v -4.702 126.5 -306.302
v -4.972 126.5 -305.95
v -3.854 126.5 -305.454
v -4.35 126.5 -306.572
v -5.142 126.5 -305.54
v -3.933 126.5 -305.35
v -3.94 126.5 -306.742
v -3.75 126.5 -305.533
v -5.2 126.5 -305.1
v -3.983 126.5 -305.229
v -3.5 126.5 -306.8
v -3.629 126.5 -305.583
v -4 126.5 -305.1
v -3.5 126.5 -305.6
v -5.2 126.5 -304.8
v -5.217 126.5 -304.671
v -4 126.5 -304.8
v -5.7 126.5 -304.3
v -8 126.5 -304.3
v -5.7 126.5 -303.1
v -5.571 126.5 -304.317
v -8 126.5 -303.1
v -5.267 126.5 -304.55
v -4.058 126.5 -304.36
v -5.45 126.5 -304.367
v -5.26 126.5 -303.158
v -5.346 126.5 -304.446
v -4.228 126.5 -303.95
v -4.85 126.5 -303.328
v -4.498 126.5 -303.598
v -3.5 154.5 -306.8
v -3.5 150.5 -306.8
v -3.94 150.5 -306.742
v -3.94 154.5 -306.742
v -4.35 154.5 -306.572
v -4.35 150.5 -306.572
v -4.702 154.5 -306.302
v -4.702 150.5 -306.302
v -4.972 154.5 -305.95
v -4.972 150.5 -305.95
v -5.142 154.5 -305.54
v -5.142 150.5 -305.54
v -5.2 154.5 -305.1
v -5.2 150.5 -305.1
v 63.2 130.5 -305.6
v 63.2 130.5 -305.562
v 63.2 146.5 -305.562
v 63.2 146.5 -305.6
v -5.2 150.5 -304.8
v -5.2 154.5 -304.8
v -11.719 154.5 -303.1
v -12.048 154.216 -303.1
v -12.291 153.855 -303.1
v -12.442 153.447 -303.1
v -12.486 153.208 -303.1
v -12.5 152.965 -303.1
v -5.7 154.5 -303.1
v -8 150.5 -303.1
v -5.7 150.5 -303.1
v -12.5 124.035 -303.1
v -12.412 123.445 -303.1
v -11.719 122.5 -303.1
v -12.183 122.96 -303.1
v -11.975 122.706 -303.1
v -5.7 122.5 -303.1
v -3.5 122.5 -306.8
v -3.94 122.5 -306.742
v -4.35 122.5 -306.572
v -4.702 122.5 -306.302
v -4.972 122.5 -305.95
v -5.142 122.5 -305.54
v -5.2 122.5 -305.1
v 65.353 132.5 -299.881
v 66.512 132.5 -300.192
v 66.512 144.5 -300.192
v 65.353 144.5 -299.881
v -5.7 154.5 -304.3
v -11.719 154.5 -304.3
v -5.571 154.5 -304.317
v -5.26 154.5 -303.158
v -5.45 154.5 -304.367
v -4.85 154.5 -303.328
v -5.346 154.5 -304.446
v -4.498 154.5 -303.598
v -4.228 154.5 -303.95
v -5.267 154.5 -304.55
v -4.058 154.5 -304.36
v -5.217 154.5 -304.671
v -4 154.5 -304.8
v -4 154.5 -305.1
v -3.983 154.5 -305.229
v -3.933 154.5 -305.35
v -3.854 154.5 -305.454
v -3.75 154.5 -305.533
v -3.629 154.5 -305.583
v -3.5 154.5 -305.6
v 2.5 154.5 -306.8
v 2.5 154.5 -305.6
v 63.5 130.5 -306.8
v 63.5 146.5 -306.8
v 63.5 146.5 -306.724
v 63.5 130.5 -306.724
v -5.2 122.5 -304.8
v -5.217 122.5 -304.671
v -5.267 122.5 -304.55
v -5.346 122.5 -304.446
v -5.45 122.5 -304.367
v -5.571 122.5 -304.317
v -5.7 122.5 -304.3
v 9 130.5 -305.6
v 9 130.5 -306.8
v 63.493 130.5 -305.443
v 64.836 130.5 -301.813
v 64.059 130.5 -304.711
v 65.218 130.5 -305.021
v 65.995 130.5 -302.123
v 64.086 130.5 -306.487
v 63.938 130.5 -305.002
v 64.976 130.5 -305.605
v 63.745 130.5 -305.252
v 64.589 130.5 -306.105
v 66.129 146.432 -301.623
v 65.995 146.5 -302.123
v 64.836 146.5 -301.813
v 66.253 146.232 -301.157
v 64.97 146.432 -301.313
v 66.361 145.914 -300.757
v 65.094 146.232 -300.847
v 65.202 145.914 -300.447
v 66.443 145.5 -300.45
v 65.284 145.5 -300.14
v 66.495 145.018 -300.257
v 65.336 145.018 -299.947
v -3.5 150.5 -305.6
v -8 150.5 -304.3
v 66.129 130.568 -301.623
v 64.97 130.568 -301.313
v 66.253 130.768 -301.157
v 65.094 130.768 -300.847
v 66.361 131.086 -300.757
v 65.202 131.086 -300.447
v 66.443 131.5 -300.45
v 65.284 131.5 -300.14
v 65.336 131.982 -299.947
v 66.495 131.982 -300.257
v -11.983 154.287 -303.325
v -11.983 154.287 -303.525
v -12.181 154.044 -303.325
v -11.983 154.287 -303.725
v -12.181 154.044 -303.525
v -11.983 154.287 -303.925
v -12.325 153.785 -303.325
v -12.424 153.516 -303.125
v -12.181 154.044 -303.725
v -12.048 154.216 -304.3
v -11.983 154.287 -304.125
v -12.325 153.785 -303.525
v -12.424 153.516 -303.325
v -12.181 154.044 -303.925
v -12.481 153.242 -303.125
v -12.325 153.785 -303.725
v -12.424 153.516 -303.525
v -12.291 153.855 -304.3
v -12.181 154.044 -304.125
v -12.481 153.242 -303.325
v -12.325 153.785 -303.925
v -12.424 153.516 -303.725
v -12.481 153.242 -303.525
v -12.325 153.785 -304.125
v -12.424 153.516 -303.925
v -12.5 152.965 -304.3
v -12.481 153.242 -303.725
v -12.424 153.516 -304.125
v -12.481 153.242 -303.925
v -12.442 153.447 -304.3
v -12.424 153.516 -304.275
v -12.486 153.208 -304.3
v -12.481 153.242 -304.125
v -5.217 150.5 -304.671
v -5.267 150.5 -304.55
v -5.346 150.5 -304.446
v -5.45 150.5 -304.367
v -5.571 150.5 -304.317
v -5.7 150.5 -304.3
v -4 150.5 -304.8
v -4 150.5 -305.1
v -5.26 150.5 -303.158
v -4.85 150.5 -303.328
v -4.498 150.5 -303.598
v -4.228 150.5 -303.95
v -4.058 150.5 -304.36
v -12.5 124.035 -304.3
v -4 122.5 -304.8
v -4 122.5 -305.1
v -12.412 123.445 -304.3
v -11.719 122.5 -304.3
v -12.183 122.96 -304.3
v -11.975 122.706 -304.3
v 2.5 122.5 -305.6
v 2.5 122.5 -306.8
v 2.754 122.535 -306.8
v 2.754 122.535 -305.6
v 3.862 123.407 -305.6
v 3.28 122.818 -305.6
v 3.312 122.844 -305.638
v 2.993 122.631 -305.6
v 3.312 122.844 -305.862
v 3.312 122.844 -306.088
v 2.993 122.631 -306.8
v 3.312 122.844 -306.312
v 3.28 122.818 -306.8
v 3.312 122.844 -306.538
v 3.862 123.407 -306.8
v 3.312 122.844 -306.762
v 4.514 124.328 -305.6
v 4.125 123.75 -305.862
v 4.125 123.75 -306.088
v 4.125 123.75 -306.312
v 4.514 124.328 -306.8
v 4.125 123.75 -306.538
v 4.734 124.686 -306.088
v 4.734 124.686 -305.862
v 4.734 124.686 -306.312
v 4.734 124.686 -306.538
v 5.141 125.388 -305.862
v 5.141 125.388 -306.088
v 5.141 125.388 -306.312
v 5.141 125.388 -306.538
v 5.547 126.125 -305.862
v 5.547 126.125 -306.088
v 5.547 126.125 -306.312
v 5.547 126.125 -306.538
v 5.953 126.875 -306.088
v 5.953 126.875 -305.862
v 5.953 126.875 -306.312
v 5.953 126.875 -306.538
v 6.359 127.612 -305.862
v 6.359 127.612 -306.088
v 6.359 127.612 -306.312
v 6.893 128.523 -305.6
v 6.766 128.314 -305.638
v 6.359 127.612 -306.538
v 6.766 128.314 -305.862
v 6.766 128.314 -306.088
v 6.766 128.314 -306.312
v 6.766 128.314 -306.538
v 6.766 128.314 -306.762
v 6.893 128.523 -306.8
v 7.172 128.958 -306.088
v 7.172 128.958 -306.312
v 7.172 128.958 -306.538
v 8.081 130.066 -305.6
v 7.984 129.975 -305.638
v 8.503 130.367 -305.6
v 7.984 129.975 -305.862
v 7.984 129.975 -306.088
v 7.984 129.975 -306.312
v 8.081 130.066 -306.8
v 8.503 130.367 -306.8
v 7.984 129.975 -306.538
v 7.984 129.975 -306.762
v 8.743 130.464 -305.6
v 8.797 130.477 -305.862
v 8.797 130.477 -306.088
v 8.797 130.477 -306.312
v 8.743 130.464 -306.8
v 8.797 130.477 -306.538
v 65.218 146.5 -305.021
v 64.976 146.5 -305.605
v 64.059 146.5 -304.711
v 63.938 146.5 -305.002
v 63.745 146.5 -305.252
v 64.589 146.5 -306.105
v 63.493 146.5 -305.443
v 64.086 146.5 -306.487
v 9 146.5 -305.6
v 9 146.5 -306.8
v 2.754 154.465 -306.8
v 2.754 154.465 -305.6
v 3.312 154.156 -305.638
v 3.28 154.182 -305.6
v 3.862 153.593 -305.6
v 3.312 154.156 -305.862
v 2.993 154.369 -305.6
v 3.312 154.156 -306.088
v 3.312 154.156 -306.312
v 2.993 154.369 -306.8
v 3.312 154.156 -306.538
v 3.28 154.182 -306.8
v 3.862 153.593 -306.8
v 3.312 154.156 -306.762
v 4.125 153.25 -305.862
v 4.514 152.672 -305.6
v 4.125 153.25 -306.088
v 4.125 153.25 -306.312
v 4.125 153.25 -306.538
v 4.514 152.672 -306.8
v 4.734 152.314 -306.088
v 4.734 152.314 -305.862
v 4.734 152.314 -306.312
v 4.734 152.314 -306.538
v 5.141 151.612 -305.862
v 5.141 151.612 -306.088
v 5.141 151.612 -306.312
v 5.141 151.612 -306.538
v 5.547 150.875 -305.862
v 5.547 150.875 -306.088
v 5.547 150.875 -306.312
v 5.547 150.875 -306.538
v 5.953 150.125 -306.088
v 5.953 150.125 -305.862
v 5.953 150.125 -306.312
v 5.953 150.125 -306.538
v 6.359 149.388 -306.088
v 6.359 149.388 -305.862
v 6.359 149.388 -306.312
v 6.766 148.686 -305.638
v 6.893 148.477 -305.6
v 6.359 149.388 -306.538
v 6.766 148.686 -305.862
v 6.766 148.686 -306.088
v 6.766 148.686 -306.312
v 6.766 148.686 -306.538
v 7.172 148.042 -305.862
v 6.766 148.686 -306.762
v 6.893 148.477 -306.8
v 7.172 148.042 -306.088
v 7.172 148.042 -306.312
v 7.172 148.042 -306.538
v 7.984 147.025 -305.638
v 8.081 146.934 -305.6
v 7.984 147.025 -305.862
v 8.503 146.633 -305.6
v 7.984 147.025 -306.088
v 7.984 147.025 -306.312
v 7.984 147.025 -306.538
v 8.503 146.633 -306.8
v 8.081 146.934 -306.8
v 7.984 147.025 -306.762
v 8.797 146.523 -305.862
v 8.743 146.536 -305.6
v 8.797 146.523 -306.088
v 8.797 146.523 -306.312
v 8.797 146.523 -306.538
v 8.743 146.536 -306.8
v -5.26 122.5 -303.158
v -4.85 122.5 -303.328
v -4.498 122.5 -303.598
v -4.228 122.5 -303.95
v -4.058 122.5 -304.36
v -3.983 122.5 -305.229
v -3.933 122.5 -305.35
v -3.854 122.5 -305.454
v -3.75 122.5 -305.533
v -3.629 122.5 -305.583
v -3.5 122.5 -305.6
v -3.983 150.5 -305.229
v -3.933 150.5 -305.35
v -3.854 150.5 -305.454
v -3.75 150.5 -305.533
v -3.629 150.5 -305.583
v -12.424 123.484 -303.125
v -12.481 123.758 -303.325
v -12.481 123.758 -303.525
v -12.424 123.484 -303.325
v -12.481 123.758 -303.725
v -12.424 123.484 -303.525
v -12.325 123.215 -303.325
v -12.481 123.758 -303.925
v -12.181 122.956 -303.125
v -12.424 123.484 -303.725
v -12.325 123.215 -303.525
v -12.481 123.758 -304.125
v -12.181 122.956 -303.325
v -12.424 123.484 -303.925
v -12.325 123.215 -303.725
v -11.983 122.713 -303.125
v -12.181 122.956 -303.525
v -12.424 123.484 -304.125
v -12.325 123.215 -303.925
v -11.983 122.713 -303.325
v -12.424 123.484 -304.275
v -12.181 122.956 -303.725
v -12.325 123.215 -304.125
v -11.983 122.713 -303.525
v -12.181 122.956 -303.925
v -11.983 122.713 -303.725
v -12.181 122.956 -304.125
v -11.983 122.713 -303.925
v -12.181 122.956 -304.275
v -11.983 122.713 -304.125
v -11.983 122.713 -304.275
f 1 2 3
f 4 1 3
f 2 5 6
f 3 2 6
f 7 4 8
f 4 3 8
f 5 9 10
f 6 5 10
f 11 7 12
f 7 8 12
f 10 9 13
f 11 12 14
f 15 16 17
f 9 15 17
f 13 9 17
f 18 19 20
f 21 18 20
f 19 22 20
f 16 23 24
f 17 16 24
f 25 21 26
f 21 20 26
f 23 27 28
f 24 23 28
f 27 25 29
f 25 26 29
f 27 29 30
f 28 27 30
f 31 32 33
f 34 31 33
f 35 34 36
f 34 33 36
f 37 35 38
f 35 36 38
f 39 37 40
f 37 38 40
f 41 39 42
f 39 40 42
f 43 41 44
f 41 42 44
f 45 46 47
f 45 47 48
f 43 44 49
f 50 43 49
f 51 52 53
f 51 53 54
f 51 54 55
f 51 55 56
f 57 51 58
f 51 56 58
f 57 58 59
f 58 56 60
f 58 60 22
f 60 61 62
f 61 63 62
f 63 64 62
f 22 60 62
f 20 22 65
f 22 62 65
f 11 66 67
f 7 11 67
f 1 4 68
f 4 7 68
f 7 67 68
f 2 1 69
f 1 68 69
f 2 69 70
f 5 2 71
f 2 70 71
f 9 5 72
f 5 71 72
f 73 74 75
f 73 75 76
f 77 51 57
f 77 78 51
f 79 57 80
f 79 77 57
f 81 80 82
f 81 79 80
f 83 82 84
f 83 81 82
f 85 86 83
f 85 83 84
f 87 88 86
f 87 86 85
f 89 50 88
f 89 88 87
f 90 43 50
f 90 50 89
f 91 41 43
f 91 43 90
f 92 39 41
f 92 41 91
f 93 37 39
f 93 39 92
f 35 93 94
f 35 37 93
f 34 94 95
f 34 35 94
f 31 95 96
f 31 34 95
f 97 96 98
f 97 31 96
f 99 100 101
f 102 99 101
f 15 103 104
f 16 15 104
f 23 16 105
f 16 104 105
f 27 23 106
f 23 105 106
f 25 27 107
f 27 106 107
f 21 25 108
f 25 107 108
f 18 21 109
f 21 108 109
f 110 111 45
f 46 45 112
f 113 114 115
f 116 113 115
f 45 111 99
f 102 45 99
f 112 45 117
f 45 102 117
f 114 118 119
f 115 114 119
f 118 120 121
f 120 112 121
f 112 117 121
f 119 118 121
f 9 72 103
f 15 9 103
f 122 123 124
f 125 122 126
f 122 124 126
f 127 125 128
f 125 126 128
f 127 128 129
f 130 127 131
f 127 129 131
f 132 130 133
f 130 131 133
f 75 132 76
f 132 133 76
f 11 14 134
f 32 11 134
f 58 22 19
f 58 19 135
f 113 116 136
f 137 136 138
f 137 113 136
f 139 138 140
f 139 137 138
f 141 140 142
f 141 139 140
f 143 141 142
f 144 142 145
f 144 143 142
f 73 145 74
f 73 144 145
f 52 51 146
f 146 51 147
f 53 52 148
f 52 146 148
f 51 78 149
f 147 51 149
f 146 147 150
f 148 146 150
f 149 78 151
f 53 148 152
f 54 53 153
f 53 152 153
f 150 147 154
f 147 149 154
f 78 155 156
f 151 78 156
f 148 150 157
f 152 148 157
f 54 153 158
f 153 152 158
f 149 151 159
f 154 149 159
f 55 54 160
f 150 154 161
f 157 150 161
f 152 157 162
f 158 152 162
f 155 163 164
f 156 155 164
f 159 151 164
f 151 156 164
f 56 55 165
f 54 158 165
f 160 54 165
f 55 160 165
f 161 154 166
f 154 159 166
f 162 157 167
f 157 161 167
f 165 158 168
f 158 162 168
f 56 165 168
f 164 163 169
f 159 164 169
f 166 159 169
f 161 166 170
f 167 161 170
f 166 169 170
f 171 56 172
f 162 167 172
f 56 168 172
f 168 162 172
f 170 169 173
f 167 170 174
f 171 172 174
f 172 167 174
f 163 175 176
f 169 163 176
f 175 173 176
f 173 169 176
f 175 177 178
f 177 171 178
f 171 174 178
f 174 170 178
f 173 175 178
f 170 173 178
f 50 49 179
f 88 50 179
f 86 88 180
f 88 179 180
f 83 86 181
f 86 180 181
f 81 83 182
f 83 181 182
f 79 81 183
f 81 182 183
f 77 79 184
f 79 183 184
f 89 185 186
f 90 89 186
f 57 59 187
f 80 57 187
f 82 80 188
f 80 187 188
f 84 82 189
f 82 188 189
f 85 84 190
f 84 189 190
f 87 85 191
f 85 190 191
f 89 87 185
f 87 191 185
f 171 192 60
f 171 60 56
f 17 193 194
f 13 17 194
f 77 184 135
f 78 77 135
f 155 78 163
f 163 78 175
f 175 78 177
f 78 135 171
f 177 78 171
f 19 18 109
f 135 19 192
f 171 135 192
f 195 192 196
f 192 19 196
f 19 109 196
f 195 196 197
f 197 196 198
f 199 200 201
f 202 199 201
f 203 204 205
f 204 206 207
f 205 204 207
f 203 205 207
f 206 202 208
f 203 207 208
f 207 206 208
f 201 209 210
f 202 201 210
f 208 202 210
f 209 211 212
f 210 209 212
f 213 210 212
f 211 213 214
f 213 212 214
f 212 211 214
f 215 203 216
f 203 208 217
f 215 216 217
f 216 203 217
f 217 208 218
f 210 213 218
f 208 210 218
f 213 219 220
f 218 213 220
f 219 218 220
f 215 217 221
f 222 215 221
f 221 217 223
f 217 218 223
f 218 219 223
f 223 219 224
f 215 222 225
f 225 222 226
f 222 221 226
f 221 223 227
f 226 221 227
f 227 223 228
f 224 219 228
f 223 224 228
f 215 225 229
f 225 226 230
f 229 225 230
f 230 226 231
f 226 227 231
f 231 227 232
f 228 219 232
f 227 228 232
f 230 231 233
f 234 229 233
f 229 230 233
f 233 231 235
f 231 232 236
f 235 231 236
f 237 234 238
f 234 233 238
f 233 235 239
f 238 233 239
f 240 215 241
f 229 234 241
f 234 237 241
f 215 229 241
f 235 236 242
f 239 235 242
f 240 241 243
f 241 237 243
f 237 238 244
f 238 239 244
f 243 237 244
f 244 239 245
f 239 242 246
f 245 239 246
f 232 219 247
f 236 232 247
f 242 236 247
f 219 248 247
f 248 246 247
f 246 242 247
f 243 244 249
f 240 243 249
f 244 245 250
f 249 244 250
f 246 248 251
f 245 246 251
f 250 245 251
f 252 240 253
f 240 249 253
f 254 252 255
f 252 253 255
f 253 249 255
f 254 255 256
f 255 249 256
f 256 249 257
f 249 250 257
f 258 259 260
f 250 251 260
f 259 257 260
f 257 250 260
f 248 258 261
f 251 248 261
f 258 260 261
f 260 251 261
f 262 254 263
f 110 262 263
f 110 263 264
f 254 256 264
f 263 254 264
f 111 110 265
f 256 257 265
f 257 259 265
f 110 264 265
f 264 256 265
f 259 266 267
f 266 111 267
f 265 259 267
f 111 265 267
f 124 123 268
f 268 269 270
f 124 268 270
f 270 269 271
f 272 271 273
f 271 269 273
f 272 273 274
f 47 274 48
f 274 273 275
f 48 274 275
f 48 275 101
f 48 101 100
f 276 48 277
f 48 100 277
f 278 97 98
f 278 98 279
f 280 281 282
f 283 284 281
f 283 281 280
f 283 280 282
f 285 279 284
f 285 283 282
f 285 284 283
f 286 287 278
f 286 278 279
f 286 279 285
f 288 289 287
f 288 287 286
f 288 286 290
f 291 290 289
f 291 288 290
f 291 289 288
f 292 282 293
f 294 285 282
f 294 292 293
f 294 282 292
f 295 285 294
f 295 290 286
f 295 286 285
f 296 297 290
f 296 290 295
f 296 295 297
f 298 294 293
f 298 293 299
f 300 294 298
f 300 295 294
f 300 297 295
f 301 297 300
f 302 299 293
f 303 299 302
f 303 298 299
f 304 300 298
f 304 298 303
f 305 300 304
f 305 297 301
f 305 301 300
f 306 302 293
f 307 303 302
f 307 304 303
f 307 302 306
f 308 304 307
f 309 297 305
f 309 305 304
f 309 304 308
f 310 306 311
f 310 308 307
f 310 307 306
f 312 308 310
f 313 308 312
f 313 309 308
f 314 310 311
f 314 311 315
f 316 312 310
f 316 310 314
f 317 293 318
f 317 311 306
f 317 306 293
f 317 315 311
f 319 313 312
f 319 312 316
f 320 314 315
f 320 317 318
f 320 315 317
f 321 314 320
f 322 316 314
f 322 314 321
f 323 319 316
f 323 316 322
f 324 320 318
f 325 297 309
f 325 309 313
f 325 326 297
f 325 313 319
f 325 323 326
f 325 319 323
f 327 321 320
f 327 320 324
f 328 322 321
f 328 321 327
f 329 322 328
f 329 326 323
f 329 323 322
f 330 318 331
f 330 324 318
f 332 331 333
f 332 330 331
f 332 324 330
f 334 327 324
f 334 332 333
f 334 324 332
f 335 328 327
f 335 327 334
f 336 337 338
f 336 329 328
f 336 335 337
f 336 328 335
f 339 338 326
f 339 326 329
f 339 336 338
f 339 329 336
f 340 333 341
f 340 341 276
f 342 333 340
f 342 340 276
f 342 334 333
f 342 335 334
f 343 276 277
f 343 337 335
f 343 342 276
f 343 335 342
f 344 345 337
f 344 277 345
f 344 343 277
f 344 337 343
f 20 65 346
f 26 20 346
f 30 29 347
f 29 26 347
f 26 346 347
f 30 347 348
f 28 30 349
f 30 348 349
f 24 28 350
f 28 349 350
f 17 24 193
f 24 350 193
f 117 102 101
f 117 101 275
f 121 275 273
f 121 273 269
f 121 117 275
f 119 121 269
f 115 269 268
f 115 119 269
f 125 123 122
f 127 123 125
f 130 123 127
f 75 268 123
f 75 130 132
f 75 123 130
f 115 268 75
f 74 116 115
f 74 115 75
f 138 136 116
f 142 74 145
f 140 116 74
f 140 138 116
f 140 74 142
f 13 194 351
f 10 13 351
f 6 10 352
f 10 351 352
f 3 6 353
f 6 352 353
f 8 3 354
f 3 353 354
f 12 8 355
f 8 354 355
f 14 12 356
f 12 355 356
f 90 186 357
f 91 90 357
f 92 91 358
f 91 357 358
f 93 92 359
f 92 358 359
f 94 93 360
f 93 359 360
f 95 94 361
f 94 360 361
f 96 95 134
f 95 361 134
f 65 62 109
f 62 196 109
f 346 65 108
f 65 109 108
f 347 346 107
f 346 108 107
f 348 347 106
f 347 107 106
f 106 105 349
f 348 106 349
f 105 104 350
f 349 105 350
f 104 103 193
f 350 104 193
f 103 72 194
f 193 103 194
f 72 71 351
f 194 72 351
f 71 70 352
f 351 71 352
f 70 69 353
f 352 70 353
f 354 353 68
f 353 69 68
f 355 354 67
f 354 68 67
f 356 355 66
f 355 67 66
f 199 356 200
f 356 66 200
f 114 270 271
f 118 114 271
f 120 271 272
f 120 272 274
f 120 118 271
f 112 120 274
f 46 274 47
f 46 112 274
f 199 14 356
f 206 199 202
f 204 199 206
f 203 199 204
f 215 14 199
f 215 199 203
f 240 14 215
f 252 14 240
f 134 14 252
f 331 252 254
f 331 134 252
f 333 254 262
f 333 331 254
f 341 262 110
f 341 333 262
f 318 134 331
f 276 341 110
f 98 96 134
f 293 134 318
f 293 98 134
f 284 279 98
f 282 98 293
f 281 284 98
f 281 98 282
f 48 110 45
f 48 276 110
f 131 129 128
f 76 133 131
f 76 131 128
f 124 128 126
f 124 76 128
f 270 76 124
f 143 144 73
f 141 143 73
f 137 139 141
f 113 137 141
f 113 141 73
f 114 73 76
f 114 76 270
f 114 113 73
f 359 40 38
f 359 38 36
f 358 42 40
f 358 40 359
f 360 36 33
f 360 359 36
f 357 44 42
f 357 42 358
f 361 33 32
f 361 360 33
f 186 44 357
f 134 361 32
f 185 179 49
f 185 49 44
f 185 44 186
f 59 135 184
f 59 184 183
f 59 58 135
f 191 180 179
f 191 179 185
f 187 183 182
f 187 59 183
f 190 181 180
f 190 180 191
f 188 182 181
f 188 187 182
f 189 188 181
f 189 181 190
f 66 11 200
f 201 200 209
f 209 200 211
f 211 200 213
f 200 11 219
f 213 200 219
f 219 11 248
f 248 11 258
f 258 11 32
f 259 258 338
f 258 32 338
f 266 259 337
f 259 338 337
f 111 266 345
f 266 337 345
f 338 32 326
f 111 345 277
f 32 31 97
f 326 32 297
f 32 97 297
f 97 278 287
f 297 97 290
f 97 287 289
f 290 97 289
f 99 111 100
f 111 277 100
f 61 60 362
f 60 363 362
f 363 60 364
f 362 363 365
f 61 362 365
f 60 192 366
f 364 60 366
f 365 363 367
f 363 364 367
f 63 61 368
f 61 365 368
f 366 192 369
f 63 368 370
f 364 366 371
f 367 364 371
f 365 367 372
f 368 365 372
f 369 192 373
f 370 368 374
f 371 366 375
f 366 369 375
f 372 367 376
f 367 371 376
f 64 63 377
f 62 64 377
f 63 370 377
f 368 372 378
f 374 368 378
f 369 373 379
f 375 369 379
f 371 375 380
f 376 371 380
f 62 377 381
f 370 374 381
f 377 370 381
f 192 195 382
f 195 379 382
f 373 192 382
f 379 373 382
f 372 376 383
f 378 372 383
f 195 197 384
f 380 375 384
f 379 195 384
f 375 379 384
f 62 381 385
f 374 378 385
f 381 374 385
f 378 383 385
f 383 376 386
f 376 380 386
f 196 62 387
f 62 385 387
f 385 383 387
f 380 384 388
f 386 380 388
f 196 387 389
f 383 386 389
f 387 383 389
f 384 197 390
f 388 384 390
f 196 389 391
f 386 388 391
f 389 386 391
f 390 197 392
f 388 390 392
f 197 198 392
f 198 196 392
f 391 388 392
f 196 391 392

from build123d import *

# Parameters (mm, degrees)
EXTRUDE_1_2_DEPTH    = 1.2
EXTRUDE_16_DEPTH     = 16
EXTRUDE_32_DEPTH     = 32
SKETCH_24_138_5_W    = 4.5
SKETCH_24_138_5_H    = 24
CUT_EXTRUDE_24_DEPTH = 20
EXTRUDE_884_DEPTH    = 1.2
FILLET_R2_R          = 2


with BuildPart() as part:
    # 草图_平板外形_总宽32_舌宽16_对称过渡 → 拉伸_板厚1点2 (new body)
    with BuildSketch(Plane.XY.offset(-306.8)):
        with BuildLine():
            Line((-3.5, 122.5), (2.5, 122.5))
            add(Edge.make_bspline(
                [(2.5, 122.5), (2.568251017, 122.504680022), (2.707904652, 122.514256172), (2.913789315, 122.58691144), (3.117968932, 122.696636373), (3.321081083, 122.844952736), (3.523655529, 123.027402997), (3.725998426, 123.241623536), (3.928269446, 123.484685473), (4.130543205, 123.753813901), (4.33285106, 124.046152711), (4.53520279, 124.358837958), (4.737597952, 124.688983876), (4.940031434, 125.033693923), (5.142496177, 125.390062896), (5.344984435, 125.755180133), (5.547488324, 126.126131323), (5.75, 126.5), (5.952511676, 126.873868677), (6.155015565, 127.244819867), (6.357503823, 127.609937104), (6.559968566, 127.966306077), (6.762402048, 128.311016124), (6.96479721, 128.641162042), (7.16714894, 128.953847289), (7.369456795, 129.246186099), (7.571730554, 129.515314527), (7.774001574, 129.758376464), (7.976344471, 129.972597003), (8.178918917, 130.155047264), (8.382031068, 130.303363627), (8.586210685, 130.41308856), (8.792095348, 130.485743828), (8.931748983, 130.495319978), (9, 130.5)],
                knots=[0, 0, 0, 0, 0.019229913, 0.039347798, 0.060985216, 0.084517213, 0.110120649, 0.137834401, 0.167605027, 0.199317689, 0.232816328, 0.26791678, 0.304415434, 0.342095061, 0.380728864, 0.420083383, 0.459920669, 0.5, 0.540079331, 0.579916617, 0.619271136, 0.657904939, 0.695584566, 0.73208322, 0.767183672, 0.800682311, 0.832394973, 0.862165599, 0.889879351, 0.915482787, 0.939014784, 0.960652202, 0.980770087, 1, 1, 1, 1], degree=3))
            Line((9, 130.5), (63.2, 130.5))
            Line((63.2, 130.5), (63.2, 146.5))
            Line((63.2, 146.5), (9, 146.5))
            add(Edge.make_bspline(
                [(2.5, 154.5), (2.568251017, 154.495319978), (2.707904652, 154.485743828), (2.913789315, 154.41308856), (3.117968932, 154.303363627), (3.321081083, 154.155047264), (3.523655529, 153.972597003), (3.725998426, 153.758376464), (3.928269446, 153.515314527), (4.130543205, 153.246186099), (4.33285106, 152.953847289), (4.53520279, 152.641162042), (4.737597952, 152.311016124), (4.940031434, 151.966306077), (5.142496177, 151.609937104), (5.344984435, 151.244819867), (5.547488324, 150.873868677), (5.75, 150.5), (5.952511676, 150.126131323), (6.155015565, 149.755180133), (6.357503823, 149.390062896), (6.559968566, 149.033693923), (6.762402048, 148.688983876), (6.96479721, 148.358837958), (7.16714894, 148.046152711), (7.369456795, 147.753813901), (7.571730554, 147.484685473), (7.774001574, 147.241623536), (7.976344471, 147.027402997), (8.178918917, 146.844952736), (8.382031068, 146.696636373), (8.586210685, 146.58691144), (8.792095348, 146.514256172), (8.931748983, 146.504680022), (9, 146.5)],
                knots=[0, 0, 0, 0, 0.019229913, 0.039347798, 0.060985216, 0.084517213, 0.110120649, 0.137834401, 0.167605027, 0.199317689, 0.232816328, 0.26791678, 0.304415434, 0.342095061, 0.380728864, 0.420083383, 0.459920669, 0.5, 0.540079331, 0.579916617, 0.619271136, 0.657904939, 0.695584566, 0.73208322, 0.767183672, 0.800682311, 0.832394973, 0.862165599, 0.889879351, 0.915482787, 0.939014784, 0.960652202, 0.980770087, 1, 1, 1, 1], degree=3))
            Line((2.5, 154.5), (-3.5, 154.5))
            Line((-3.5, 154.5), (-3.5, 122.5))
        make_face()
    extrude(amount=EXTRUDE_1_2_DEPTH)

    # Sketch 429 → 拉伸_舌宽16 (add)
    with BuildSketch(Plane(origin=(0, 130.5, 0), x_dir=(1, 0, 0), z_dir=(0, 1, 0))):
        with BuildLine():
            Line((9, 306.8), (63.5, 306.8))
            Line((63.5, 306.8), (63.5, 306.723790008))
            ThreePointArc((63.5, 306.723790008), (64.58930082, 306.104776448), (65.218221983, 305.021165708))
            Line((65.218221983, 305.021165708), (66.512317209, 300.191536577))
            Line((66.512317209, 300.191536577), (65.353206217, 299.880953723))
            Line((65.353206217, 299.880953723), (64.059110992, 304.710582854))
            ThreePointArc((64.059110992, 304.710582854), (63.74465041, 305.252388224), (63.2, 305.561895004))
            Line((63.2, 305.561895004), (63.2, 305.6))
            Line((63.2, 305.6), (9, 305.6))
            Line((9, 305.6), (9, 306.8))
        make_face()
    extrude(amount=EXTRUDE_16_DEPTH)

    # Sketch 524 → 拉伸_头部总宽32 (add)
    with BuildSketch(Plane(origin=(0, 122.5, 0), x_dir=(1, 0, 0), z_dir=(0, 1, 0))):
        with BuildLine():
            Line((-5.7, 304.3), (-11.71944631, 304.3))
            Line((-11.71944631, 304.3), (-11.71944631, 303.1))
            Line((-11.71944631, 303.1), (-5.7, 303.1))
            ThreePointArc((-5.7, 303.1), (-4.497918472, 303.597918472), (-4, 304.8))
            Line((-4, 304.8), (-4, 305.1))
            ThreePointArc((-4, 305.1), (-3.853553391, 305.453553391), (-3.5, 305.6))
            Line((-3.5, 305.6), (2.5, 305.6))
            Line((2.5, 305.6), (2.5, 306.8))
            Line((2.5, 306.8), (-3.5, 306.8))
            ThreePointArc((-3.5, 306.8), (-4.702081528, 306.302081528), (-5.2, 305.1))
            Line((-5.2, 305.1), (-5.2, 304.8))
            ThreePointArc((-5.2, 304.8), (-5.346446609, 304.446446609), (-5.7, 304.3))
        make_face()
    extrude(amount=EXTRUDE_32_DEPTH)

    # 草图_榫槽净宽24_中线138点5 → 切除_榫槽24 (cut)
    with BuildSketch(Plane.XY.offset(-299)):
        with Locations((-5.75, 138.5)):
            Rectangle(SKETCH_24_138_5_W, SKETCH_24_138_5_H)
    extrude(amount=-CUT_EXTRUDE_24_DEPTH, mode=Mode.SUBTRACT)

    # 草图_头部完整外形_总宽32_槽24 → Extrude 884 (add)
    with BuildSketch(Plane.XY.offset(-304.3)):
        with BuildLine():
            Line((-5.7, 154.5), (-5.7, 150.5))
            Line((-5.7, 150.5), (-8, 150.5))
            Line((-8, 150.5), (-8, 126.5))
            Line((-8, 126.5), (-5.7, 126.5))
            Line((-5.7, 126.5), (-5.7, 122.5))
            Line((-5.7, 122.5), (-11.71944631, 122.5))
            add(Edge.make_bspline(
                [(-12.5, 124.034562212), (-12.499938159, 124.023029786), (-12.499814468, 123.999963286), (-12.498936319, 123.965367365), (-12.497443181, 123.93078278), (-12.495403218, 123.896208954), (-12.492747447, 123.861654709), (-12.489510446, 123.827122022), (-12.485676021, 123.792616625), (-12.481245518, 123.758142921), (-12.476215317, 123.723705745), (-12.47058192, 123.689310059), (-12.464341601, 123.654960897), (-12.457490017, 123.620663481), (-12.450022451, 123.586423185), (-12.441933692, 123.552245581), (-12.433218056, 123.518136449), (-12.423869366, 123.484101803), (-12.413880931, 123.450147918), (-12.403245533, 123.416281356), (-12.391955405, 123.382508994), (-12.380002212, 123.348838059), (-12.367377024, 123.31527616), (-12.354070301, 123.281831329), (-12.340071858, 123.248512061), (-12.325370845, 123.215327364), (-12.309955716, 123.182286805), (-12.293814204, 123.149400568), (-12.276933286, 123.116679519), (-12.259299156, 123.08413527), (-12.240897191, 123.05178026), (-12.221711924, 123.019627836), (-12.201727007, 122.987692349), (-12.180925191, 122.955989258), (-12.159288292, 122.92453525), (-12.136797175, 122.893348363), (-12.113431735, 122.862448139), (-12.089170893, 122.831855779), (-12.063992595, 122.801594323), (-12.037873835, 122.771688857), (-12.010790698, 122.742166721), (-11.982718406, 122.713057784), (-11.953631496, 122.684394601), (-11.923503642, 122.656213171), (-11.892309147, 122.628551369), (-11.860018463, 122.601456324), (-11.826614179, 122.574961378), (-11.792043997, 122.549159388), (-11.756366816, 122.523975845), (-11.731804684, 122.508025417), (-11.71944631, 122.5)],
                knots=[0, 0, 0, 0, 0.019280259, 0.038563274, 0.057853041, 0.077151606, 0.096462833, 0.115789535, 0.135134996, 0.15450244, 0.173895129, 0.193316406, 0.212769662, 0.232258368, 0.251786071, 0.271356411, 0.290973123, 0.310640051, 0.330361155, 0.350140527, 0.369982395, 0.389891141, 0.409871307, 0.429927615, 0.450064974, 0.4702885, 0.490603526, 0.511015624, 0.531530615, 0.552154592, 0.572893933, 0.593755326, 0.61474578, 0.635872653, 0.657143665, 0.678566916, 0.700150912, 0.721904572, 0.743837244, 0.765958718, 0.788279226, 0.81080944, 0.83356046, 0.856543784, 0.879771256, 0.903255123, 0.927007303, 0.951041228, 0.97536652, 1, 1, 1, 1], degree=3))
            Line((-12.5, 124.034562212), (-12.5, 152.965437788))
            add(Edge.make_bspline(
                [(-11.71944631, 154.5), (-11.731804684, 154.491974583), (-11.756366816, 154.476024155), (-11.792043997, 154.450840612), (-11.826614179, 154.425038622), (-11.860018463, 154.398543676), (-11.892309147, 154.371448631), (-11.923503642, 154.343786829), (-11.953631496, 154.315605399), (-11.982718406, 154.286942216), (-12.010790698, 154.257833279), (-12.037873835, 154.228311143), (-12.063992595, 154.198405677), (-12.089170893, 154.168144221), (-12.113431735, 154.137551861), (-12.136797175, 154.106651637), (-12.159288292, 154.07546475), (-12.180925191, 154.044010742), (-12.201727007, 154.012307651), (-12.221711924, 153.980372164), (-12.240897191, 153.94821974), (-12.259299156, 153.91586473), (-12.276933286, 153.883320481), (-12.293814204, 153.850599432), (-12.309955716, 153.817713195), (-12.325370845, 153.784672636), (-12.340071858, 153.751487939), (-12.354070301, 153.718168671), (-12.367377024, 153.68472384), (-12.380002212, 153.651161941), (-12.391955405, 153.617491006), (-12.403245533, 153.583718644), (-12.413880931, 153.549852082), (-12.423869366, 153.515898197), (-12.433218056, 153.481863551), (-12.441933692, 153.447754419), (-12.450022451, 153.413576815), (-12.457490017, 153.379336519), (-12.464341601, 153.345039103), (-12.47058192, 153.310689941), (-12.476215317, 153.276294255), (-12.481245518, 153.241857079), (-12.485676021, 153.207383375), (-12.489510446, 153.172877978), (-12.492747447, 153.138345291), (-12.495403218, 153.103791046), (-12.497443181, 153.06921722), (-12.498936319, 153.034632635), (-12.499814468, 153.000036714), (-12.499938159, 152.976970214), (-12.5, 152.965437788)],
                knots=[0, 0, 0, 0, 0.02463348, 0.048958772, 0.072992697, 0.096744877, 0.120228744, 0.143456216, 0.16643954, 0.18919056, 0.211720774, 0.234041282, 0.256162756, 0.278095428, 0.299849088, 0.321433084, 0.342856335, 0.364127347, 0.38525422, 0.406244674, 0.427106067, 0.447845408, 0.468469385, 0.488984376, 0.509396474, 0.5297115, 0.549935026, 0.570072385, 0.590128693, 0.610108859, 0.630017605, 0.649859473, 0.669638845, 0.689359949, 0.709026877, 0.728643589, 0.748213929, 0.767741632, 0.787230338, 0.806683594, 0.826104871, 0.84549756, 0.864865004, 0.884210465, 0.903537167, 0.922848394, 0.942146959, 0.961436726, 0.980719741, 1, 1, 1, 1], degree=3))
            Line((-11.71944631, 154.5), (-5.7, 154.5))
        make_face()
    extrude(amount=EXTRUDE_884_DEPTH)

    # 圆角_舌片上下端角_R2
    fillet_r2_edges = [part.edges().sort_by_distance(p)[0] for p in [
        (65.932761713, 146.5, -300.03624515),
        (65.932761713, 130.5, -300.03624515),
    ]]
    fillet(fillet_r2_edges, radius=FILLET_R2_R)


solid = part.part
